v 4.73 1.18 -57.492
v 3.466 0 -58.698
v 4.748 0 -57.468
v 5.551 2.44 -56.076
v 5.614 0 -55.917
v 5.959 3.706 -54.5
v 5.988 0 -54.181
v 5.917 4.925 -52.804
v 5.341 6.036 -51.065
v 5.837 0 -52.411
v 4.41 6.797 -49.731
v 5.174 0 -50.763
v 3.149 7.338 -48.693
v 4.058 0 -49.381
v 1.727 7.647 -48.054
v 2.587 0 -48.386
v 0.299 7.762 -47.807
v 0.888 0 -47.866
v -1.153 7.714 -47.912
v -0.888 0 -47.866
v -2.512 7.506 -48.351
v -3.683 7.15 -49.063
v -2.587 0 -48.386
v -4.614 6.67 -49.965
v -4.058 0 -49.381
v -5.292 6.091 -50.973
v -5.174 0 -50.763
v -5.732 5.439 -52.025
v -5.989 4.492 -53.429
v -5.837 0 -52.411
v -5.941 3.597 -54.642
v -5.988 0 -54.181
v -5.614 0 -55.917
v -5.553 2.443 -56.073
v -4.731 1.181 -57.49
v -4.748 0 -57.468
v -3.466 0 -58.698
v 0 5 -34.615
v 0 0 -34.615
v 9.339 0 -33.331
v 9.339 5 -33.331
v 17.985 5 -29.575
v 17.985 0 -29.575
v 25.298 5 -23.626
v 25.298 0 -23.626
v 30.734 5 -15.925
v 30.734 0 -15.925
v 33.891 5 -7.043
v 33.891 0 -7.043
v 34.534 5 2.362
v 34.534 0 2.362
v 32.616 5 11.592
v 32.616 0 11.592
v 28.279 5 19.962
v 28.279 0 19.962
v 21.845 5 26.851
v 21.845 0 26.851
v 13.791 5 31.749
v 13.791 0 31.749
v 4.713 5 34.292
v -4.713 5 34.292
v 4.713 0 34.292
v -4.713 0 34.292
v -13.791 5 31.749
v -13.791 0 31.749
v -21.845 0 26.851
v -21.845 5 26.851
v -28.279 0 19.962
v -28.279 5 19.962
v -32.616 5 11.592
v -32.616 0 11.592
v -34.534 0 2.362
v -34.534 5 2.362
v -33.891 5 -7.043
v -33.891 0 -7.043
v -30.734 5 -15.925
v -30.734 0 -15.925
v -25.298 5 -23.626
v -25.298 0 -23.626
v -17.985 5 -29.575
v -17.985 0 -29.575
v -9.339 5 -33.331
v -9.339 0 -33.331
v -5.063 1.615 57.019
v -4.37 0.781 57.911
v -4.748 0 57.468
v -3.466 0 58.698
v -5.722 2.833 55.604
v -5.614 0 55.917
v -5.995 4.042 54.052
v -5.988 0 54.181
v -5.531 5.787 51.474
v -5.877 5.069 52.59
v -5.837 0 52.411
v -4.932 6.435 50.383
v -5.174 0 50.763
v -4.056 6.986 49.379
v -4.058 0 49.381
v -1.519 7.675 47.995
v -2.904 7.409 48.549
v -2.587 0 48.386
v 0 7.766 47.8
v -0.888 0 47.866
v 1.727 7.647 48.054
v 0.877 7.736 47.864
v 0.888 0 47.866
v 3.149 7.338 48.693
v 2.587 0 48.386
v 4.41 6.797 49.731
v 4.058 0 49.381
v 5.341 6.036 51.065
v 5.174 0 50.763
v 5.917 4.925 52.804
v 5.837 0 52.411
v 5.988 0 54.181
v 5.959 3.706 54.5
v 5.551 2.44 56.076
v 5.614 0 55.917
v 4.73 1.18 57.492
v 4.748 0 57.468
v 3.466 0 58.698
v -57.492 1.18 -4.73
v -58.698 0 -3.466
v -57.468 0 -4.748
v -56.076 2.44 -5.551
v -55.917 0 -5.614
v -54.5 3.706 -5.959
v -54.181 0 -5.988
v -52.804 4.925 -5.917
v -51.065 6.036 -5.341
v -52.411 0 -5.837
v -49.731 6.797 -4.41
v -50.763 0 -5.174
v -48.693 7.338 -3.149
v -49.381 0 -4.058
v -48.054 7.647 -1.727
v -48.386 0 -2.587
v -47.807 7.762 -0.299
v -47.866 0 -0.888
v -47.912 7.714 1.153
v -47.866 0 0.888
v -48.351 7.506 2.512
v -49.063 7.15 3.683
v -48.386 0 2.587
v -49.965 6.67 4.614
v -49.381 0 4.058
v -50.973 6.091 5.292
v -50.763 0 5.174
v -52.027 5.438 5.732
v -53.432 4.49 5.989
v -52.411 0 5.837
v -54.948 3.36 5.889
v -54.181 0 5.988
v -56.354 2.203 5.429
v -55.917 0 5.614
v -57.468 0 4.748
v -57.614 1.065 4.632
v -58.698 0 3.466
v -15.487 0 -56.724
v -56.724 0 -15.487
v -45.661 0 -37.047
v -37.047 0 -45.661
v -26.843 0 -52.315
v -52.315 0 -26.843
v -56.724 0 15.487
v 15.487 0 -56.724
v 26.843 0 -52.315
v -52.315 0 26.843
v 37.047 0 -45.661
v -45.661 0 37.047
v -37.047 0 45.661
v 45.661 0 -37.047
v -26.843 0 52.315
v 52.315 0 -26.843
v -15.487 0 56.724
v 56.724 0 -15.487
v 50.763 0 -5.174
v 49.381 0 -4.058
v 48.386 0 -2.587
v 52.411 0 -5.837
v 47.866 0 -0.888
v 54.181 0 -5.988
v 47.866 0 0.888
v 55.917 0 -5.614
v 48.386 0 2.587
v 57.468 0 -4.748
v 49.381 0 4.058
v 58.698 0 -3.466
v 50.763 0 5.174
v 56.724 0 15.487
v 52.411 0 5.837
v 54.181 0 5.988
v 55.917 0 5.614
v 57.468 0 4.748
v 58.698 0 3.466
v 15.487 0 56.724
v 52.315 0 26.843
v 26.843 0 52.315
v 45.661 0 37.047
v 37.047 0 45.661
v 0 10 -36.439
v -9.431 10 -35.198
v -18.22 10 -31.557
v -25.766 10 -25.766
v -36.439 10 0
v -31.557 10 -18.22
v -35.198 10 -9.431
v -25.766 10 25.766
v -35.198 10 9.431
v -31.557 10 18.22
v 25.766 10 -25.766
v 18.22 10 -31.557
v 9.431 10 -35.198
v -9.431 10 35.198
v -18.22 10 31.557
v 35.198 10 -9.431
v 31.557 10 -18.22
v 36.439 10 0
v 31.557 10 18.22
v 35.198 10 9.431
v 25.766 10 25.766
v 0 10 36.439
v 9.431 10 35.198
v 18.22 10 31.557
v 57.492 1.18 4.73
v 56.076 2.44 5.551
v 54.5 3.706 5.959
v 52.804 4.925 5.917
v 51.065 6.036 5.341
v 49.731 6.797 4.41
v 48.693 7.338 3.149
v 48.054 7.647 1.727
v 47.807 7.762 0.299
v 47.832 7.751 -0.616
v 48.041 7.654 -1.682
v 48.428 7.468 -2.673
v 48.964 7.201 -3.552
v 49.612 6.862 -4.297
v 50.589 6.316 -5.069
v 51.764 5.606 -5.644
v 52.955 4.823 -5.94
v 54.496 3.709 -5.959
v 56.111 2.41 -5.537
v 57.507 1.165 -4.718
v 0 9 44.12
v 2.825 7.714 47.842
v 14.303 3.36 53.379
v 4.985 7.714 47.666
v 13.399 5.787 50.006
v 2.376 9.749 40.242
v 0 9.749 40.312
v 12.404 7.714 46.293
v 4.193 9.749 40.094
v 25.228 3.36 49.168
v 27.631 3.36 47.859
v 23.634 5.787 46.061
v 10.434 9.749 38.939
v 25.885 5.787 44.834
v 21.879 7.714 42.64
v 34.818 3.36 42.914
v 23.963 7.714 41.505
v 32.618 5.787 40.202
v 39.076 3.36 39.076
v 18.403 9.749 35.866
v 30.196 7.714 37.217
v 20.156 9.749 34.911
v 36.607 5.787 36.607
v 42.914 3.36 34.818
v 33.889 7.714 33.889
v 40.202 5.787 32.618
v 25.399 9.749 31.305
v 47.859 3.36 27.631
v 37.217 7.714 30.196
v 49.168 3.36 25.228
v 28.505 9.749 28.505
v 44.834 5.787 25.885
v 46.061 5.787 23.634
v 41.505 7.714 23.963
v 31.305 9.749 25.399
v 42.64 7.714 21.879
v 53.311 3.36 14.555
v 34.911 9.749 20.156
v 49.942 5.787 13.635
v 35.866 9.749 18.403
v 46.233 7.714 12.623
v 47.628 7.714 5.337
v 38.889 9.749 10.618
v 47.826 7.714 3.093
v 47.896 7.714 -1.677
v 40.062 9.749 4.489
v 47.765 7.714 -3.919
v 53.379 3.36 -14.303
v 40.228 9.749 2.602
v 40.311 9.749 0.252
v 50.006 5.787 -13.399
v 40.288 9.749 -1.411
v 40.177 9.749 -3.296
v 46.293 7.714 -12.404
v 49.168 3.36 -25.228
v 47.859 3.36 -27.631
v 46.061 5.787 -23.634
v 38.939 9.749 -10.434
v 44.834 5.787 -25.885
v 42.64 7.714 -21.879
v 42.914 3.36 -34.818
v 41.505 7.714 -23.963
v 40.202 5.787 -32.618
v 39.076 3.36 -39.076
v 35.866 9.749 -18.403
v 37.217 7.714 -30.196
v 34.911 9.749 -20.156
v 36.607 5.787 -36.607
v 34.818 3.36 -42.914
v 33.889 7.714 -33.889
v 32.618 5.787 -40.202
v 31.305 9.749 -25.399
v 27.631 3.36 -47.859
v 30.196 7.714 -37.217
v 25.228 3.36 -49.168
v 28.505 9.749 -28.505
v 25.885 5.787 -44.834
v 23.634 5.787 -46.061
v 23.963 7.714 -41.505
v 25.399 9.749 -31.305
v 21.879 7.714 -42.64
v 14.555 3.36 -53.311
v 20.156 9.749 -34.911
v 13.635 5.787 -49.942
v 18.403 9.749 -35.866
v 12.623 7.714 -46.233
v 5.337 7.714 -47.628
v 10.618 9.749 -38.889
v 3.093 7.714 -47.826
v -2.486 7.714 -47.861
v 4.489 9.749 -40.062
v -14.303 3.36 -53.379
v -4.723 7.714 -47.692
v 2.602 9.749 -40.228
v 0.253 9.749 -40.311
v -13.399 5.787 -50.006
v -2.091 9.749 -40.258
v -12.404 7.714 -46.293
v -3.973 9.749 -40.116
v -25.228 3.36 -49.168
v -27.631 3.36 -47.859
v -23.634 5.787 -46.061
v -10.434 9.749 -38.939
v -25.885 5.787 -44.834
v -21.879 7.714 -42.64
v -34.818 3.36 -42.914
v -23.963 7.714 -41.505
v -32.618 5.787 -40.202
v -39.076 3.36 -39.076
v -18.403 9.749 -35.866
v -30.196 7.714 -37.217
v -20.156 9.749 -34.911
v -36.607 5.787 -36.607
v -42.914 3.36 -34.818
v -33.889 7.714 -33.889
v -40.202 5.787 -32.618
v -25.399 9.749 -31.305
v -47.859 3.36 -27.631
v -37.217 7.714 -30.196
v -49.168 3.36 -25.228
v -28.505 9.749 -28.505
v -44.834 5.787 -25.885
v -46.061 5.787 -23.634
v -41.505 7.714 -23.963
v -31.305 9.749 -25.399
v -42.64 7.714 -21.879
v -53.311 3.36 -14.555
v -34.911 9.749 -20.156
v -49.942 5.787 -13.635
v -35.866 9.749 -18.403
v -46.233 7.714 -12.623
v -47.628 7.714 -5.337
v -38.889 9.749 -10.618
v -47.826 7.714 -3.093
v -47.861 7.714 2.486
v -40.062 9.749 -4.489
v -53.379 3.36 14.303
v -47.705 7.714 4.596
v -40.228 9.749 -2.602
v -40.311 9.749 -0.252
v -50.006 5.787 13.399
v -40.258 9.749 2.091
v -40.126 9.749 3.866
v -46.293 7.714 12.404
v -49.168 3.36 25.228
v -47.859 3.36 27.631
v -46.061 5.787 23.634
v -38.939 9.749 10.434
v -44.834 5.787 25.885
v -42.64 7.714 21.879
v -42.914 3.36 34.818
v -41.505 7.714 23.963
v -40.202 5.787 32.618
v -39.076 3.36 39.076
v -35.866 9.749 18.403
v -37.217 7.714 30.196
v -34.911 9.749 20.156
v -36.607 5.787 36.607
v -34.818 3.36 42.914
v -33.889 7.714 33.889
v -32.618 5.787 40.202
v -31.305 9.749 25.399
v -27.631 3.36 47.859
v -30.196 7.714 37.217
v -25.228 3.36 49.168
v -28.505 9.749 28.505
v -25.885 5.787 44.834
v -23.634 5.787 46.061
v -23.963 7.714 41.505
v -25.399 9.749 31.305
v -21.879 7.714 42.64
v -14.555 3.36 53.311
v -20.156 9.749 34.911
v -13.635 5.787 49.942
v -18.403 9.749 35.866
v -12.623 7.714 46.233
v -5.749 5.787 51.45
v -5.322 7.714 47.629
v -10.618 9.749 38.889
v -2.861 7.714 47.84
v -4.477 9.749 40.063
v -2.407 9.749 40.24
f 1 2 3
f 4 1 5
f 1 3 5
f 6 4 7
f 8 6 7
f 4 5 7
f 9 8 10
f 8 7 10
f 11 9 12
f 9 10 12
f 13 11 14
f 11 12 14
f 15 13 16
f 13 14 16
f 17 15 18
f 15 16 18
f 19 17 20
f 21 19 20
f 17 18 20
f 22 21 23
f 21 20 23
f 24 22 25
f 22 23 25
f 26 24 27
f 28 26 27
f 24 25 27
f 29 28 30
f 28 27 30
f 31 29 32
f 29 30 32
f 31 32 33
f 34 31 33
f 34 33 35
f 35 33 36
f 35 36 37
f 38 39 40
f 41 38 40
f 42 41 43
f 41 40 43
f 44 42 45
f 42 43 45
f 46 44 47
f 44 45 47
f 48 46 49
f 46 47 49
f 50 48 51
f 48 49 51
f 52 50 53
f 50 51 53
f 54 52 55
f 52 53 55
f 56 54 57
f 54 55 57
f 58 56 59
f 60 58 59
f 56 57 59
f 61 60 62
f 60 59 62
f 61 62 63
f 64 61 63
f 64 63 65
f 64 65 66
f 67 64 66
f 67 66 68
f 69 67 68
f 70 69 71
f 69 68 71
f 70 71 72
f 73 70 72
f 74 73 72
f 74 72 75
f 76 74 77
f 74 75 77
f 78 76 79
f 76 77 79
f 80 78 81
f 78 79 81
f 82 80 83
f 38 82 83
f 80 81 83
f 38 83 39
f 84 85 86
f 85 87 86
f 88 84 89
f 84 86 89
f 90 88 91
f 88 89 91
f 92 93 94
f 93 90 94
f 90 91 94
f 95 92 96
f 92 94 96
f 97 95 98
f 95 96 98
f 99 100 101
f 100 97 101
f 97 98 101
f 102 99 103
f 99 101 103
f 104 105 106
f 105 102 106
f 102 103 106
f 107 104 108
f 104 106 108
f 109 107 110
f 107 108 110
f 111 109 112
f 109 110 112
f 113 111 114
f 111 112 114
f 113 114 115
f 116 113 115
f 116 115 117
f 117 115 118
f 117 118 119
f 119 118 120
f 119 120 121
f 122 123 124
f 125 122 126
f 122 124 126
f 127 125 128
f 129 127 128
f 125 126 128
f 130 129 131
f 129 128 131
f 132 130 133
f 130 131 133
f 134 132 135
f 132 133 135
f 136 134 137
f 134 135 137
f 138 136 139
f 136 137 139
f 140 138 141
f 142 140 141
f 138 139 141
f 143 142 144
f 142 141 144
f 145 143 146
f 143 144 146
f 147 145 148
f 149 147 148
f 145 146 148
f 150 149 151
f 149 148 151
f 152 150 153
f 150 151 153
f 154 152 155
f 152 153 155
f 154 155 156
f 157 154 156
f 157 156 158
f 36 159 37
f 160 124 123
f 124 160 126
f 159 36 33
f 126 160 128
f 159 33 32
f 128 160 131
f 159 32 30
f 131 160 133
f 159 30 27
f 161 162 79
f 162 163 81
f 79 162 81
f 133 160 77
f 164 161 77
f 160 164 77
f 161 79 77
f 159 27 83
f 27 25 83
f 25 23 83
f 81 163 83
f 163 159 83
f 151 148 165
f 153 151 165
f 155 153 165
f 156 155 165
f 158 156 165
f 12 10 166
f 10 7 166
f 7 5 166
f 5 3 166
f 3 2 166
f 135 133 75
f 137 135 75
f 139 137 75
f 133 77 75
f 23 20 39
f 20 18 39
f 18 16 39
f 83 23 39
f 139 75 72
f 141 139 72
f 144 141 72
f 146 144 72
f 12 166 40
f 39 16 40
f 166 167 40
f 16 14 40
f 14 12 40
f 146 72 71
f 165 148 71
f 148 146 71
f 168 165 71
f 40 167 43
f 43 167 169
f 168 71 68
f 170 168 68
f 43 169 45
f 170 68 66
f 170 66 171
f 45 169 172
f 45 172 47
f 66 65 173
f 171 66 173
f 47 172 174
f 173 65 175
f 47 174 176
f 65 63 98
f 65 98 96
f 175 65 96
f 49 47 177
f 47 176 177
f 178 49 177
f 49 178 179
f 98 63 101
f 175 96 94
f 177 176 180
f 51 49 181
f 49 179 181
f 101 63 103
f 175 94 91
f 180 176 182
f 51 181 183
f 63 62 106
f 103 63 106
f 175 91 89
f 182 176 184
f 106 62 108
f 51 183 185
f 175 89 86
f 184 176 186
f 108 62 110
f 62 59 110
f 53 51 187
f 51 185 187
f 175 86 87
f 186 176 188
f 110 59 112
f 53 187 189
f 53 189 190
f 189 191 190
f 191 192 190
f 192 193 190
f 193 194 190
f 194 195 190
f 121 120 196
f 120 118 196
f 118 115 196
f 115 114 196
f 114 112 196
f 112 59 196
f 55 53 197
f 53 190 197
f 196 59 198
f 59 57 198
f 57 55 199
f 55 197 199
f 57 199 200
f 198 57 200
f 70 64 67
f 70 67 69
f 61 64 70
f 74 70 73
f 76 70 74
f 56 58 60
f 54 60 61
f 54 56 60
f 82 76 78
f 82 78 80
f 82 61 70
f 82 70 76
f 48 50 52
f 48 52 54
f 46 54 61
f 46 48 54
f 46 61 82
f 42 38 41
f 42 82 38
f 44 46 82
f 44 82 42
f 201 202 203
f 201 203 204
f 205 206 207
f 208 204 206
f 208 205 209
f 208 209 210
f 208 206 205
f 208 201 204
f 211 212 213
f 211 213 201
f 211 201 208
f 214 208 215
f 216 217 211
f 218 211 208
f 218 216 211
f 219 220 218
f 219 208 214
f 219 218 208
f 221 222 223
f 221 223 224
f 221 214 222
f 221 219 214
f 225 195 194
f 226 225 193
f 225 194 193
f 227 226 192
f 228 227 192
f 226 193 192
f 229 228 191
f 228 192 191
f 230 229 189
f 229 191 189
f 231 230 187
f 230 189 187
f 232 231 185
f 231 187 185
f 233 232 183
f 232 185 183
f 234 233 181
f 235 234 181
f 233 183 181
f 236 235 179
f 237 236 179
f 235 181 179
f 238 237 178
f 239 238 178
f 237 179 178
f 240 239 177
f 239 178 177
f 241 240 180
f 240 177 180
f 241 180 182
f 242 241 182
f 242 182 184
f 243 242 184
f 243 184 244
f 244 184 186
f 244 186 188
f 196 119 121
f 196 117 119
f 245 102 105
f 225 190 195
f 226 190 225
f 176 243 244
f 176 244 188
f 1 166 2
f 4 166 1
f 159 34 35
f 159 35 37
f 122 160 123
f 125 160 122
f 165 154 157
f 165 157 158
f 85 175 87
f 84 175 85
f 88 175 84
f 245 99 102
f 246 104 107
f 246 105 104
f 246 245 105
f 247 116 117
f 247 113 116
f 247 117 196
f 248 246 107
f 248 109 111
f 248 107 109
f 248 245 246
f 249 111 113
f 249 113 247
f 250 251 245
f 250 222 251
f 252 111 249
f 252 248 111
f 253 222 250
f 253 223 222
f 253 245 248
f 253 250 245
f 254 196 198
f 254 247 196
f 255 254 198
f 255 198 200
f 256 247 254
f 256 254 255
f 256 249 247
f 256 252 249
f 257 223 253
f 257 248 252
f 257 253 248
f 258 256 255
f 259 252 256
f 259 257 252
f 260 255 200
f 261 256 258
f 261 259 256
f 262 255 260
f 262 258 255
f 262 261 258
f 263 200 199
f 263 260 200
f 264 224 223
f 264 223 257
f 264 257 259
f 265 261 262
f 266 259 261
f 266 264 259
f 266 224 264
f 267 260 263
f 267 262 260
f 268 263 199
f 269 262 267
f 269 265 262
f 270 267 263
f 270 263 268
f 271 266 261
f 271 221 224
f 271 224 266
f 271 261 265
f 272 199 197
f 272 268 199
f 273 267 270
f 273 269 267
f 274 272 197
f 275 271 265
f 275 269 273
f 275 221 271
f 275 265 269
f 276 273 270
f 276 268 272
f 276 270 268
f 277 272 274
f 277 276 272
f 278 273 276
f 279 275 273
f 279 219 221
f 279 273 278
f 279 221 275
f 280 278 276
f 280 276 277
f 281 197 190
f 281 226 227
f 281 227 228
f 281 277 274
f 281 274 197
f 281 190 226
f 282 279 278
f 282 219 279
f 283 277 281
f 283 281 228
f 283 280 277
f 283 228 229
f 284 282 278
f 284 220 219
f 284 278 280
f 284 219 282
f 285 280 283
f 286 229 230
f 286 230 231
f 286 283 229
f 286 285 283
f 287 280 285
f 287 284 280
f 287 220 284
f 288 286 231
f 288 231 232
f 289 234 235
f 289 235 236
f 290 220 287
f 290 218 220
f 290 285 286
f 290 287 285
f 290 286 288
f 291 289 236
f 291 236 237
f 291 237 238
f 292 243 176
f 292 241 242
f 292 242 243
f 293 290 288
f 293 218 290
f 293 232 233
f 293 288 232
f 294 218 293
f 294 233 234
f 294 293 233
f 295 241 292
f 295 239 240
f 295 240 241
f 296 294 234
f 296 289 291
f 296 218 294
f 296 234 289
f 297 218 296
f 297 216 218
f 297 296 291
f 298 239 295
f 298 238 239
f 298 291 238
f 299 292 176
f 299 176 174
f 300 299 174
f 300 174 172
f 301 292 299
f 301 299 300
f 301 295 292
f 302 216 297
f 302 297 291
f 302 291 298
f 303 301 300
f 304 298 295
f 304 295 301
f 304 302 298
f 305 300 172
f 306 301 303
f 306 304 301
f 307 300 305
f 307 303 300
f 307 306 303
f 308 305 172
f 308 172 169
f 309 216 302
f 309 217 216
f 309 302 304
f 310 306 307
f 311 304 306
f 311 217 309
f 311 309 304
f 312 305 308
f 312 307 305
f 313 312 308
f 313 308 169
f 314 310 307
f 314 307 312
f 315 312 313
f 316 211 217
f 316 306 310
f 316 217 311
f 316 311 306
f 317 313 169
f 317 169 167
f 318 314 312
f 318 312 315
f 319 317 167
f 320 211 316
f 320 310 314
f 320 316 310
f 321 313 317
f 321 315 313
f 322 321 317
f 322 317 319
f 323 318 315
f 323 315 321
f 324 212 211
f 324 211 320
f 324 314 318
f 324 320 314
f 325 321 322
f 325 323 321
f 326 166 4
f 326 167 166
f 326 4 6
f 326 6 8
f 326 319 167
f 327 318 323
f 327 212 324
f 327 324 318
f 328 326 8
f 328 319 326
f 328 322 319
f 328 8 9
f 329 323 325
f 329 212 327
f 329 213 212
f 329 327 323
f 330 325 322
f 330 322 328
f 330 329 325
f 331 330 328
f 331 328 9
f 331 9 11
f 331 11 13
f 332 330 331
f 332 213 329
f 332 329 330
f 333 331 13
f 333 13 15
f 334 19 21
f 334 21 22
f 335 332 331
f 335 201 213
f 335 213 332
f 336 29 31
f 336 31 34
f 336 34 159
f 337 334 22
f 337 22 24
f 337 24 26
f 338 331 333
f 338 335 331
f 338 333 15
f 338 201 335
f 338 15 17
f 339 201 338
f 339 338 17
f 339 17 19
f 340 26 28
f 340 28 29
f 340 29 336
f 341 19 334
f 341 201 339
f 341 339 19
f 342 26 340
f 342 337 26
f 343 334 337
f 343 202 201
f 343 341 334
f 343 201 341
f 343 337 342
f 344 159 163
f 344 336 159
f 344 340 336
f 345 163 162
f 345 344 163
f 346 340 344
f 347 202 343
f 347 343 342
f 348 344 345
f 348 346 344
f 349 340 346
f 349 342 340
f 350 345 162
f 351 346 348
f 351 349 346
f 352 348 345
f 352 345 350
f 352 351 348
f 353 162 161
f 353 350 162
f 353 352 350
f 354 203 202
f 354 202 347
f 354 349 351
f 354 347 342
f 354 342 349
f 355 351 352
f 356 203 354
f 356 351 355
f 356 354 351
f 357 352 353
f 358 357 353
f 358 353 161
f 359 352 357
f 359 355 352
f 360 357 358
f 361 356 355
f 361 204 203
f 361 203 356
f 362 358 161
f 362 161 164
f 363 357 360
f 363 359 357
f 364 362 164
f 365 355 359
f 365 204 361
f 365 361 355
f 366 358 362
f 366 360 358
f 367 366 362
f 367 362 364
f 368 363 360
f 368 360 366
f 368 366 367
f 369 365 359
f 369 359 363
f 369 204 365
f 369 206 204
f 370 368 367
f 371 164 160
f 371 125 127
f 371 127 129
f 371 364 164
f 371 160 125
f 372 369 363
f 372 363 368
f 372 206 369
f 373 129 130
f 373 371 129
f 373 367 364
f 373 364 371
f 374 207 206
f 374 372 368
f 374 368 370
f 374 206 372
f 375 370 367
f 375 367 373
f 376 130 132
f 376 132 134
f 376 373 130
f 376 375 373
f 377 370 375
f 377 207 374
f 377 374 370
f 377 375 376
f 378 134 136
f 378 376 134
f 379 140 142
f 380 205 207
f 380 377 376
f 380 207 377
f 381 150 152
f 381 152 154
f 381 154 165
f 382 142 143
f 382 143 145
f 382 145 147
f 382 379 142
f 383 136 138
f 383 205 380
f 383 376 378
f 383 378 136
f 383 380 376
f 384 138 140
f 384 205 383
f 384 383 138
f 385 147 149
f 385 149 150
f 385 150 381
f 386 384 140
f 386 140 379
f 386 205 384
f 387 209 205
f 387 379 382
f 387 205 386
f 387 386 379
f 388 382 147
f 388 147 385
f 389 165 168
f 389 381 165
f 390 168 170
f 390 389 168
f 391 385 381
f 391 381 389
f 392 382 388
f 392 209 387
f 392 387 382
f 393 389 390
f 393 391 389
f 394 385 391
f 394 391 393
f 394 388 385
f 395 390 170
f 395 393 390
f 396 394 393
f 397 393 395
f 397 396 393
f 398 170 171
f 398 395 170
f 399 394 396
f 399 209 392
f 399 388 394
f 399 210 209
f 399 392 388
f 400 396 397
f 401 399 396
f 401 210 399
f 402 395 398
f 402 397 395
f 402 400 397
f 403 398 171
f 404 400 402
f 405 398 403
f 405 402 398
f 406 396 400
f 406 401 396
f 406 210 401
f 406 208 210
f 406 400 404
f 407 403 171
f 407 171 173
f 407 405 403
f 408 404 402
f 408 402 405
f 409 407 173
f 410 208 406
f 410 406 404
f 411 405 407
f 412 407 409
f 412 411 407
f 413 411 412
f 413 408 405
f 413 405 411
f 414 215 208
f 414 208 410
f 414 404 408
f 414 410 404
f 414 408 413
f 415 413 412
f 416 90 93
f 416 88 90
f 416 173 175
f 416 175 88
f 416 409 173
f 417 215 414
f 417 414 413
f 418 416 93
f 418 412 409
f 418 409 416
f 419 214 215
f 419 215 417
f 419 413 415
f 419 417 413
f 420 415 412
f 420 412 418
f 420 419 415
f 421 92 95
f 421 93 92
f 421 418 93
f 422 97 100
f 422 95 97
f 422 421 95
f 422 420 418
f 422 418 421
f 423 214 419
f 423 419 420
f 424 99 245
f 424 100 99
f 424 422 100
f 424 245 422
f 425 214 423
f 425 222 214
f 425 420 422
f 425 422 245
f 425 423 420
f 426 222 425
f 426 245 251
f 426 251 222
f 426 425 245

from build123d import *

# Parameters (mm, degrees)
CROQUIS1_R              = 58.8
SALIENTE_EXTRUIR1_DEPTH = 10
REDONDEO1_R             = 30
CROQUIS2_R              = 34.614627086
CORTAR_EXTRUIR1_DEPTH   = 5
CROQUIS3_R              = 6
CORTAR_EXTRUIR2_DEPTH   = 32


with BuildPart() as part:
    # Croquis1 → Saliente-Extruir1 (new body)
    with BuildSketch(Plane(origin=(0, 0, 0), x_dir=(1, 0, 0), z_dir=(0, 1, 0))):
        with Locations(Location((0, 0, 0), (0, 0, 270))):
            Circle(CROQUIS1_R)
    extrude(amount=SALIENTE_EXTRUIR1_DEPTH)

    # Redondeo1
    # the kernel refuses this fillet: 30 mm, written as the material it takes off along each edge
    with BuildSketch(Plane(origin=(0, 10, 0), x_dir=(0, 0, 1), z_dir=(-1, 0, 0))) as redondeo1_piece_1:
        with BuildLine():
            CenterArc((36.439320225, -30), REDONDEO1_R, 41.810314896, 48.189685104)
            Line((36.439320225, 0), (36.439320225, 0.6))
            Line((36.439320225, 0.6), (58.8, 0.6))
            Line((58.8, 0.6), (59.4, 0))
            ThreePointArc((59.4, 0), (59.4, -5), (59.247213595, -9.6))
            Line((59.247213595, -9.6), (58.8, -10))
        make_face()
    revolve(axis=Axis((0, 10, 0), (0, 1, 0)), mode=Mode.SUBTRACT)

    # Croquis2 → Cortar-Extruir1 (cut)
    with BuildSketch(Plane(origin=(0, 0, 0), x_dir=(-1, 0, 0), z_dir=(0, -1, 0))):
        with Locations(Location((0, 0, 0), (0, 0, 90))):
            Circle(CROQUIS2_R)
    extrude(amount=-CORTAR_EXTRUIR1_DEPTH, mode=Mode.SUBTRACT)

    # Croquis3 → Cortar-Extruir2 (cut)
    with BuildSketch(Plane(origin=(0, 0, 0), x_dir=(-1, 0, 0), z_dir=(0, -1, 0))):
        with Locations((0, -53.8)):
            Circle(CROQUIS3_R)
        with Locations((-53.8, 0)):
            Circle(CROQUIS3_R)
        with Locations((0, 53.8)):
            Circle(CROQUIS3_R)
        with Locations((53.8, 0)):
            Circle(CROQUIS3_R)
    extrude(amount=-CORTAR_EXTRUIR2_DEPTH, mode=Mode.SUBTRACT)


solid = part.part
